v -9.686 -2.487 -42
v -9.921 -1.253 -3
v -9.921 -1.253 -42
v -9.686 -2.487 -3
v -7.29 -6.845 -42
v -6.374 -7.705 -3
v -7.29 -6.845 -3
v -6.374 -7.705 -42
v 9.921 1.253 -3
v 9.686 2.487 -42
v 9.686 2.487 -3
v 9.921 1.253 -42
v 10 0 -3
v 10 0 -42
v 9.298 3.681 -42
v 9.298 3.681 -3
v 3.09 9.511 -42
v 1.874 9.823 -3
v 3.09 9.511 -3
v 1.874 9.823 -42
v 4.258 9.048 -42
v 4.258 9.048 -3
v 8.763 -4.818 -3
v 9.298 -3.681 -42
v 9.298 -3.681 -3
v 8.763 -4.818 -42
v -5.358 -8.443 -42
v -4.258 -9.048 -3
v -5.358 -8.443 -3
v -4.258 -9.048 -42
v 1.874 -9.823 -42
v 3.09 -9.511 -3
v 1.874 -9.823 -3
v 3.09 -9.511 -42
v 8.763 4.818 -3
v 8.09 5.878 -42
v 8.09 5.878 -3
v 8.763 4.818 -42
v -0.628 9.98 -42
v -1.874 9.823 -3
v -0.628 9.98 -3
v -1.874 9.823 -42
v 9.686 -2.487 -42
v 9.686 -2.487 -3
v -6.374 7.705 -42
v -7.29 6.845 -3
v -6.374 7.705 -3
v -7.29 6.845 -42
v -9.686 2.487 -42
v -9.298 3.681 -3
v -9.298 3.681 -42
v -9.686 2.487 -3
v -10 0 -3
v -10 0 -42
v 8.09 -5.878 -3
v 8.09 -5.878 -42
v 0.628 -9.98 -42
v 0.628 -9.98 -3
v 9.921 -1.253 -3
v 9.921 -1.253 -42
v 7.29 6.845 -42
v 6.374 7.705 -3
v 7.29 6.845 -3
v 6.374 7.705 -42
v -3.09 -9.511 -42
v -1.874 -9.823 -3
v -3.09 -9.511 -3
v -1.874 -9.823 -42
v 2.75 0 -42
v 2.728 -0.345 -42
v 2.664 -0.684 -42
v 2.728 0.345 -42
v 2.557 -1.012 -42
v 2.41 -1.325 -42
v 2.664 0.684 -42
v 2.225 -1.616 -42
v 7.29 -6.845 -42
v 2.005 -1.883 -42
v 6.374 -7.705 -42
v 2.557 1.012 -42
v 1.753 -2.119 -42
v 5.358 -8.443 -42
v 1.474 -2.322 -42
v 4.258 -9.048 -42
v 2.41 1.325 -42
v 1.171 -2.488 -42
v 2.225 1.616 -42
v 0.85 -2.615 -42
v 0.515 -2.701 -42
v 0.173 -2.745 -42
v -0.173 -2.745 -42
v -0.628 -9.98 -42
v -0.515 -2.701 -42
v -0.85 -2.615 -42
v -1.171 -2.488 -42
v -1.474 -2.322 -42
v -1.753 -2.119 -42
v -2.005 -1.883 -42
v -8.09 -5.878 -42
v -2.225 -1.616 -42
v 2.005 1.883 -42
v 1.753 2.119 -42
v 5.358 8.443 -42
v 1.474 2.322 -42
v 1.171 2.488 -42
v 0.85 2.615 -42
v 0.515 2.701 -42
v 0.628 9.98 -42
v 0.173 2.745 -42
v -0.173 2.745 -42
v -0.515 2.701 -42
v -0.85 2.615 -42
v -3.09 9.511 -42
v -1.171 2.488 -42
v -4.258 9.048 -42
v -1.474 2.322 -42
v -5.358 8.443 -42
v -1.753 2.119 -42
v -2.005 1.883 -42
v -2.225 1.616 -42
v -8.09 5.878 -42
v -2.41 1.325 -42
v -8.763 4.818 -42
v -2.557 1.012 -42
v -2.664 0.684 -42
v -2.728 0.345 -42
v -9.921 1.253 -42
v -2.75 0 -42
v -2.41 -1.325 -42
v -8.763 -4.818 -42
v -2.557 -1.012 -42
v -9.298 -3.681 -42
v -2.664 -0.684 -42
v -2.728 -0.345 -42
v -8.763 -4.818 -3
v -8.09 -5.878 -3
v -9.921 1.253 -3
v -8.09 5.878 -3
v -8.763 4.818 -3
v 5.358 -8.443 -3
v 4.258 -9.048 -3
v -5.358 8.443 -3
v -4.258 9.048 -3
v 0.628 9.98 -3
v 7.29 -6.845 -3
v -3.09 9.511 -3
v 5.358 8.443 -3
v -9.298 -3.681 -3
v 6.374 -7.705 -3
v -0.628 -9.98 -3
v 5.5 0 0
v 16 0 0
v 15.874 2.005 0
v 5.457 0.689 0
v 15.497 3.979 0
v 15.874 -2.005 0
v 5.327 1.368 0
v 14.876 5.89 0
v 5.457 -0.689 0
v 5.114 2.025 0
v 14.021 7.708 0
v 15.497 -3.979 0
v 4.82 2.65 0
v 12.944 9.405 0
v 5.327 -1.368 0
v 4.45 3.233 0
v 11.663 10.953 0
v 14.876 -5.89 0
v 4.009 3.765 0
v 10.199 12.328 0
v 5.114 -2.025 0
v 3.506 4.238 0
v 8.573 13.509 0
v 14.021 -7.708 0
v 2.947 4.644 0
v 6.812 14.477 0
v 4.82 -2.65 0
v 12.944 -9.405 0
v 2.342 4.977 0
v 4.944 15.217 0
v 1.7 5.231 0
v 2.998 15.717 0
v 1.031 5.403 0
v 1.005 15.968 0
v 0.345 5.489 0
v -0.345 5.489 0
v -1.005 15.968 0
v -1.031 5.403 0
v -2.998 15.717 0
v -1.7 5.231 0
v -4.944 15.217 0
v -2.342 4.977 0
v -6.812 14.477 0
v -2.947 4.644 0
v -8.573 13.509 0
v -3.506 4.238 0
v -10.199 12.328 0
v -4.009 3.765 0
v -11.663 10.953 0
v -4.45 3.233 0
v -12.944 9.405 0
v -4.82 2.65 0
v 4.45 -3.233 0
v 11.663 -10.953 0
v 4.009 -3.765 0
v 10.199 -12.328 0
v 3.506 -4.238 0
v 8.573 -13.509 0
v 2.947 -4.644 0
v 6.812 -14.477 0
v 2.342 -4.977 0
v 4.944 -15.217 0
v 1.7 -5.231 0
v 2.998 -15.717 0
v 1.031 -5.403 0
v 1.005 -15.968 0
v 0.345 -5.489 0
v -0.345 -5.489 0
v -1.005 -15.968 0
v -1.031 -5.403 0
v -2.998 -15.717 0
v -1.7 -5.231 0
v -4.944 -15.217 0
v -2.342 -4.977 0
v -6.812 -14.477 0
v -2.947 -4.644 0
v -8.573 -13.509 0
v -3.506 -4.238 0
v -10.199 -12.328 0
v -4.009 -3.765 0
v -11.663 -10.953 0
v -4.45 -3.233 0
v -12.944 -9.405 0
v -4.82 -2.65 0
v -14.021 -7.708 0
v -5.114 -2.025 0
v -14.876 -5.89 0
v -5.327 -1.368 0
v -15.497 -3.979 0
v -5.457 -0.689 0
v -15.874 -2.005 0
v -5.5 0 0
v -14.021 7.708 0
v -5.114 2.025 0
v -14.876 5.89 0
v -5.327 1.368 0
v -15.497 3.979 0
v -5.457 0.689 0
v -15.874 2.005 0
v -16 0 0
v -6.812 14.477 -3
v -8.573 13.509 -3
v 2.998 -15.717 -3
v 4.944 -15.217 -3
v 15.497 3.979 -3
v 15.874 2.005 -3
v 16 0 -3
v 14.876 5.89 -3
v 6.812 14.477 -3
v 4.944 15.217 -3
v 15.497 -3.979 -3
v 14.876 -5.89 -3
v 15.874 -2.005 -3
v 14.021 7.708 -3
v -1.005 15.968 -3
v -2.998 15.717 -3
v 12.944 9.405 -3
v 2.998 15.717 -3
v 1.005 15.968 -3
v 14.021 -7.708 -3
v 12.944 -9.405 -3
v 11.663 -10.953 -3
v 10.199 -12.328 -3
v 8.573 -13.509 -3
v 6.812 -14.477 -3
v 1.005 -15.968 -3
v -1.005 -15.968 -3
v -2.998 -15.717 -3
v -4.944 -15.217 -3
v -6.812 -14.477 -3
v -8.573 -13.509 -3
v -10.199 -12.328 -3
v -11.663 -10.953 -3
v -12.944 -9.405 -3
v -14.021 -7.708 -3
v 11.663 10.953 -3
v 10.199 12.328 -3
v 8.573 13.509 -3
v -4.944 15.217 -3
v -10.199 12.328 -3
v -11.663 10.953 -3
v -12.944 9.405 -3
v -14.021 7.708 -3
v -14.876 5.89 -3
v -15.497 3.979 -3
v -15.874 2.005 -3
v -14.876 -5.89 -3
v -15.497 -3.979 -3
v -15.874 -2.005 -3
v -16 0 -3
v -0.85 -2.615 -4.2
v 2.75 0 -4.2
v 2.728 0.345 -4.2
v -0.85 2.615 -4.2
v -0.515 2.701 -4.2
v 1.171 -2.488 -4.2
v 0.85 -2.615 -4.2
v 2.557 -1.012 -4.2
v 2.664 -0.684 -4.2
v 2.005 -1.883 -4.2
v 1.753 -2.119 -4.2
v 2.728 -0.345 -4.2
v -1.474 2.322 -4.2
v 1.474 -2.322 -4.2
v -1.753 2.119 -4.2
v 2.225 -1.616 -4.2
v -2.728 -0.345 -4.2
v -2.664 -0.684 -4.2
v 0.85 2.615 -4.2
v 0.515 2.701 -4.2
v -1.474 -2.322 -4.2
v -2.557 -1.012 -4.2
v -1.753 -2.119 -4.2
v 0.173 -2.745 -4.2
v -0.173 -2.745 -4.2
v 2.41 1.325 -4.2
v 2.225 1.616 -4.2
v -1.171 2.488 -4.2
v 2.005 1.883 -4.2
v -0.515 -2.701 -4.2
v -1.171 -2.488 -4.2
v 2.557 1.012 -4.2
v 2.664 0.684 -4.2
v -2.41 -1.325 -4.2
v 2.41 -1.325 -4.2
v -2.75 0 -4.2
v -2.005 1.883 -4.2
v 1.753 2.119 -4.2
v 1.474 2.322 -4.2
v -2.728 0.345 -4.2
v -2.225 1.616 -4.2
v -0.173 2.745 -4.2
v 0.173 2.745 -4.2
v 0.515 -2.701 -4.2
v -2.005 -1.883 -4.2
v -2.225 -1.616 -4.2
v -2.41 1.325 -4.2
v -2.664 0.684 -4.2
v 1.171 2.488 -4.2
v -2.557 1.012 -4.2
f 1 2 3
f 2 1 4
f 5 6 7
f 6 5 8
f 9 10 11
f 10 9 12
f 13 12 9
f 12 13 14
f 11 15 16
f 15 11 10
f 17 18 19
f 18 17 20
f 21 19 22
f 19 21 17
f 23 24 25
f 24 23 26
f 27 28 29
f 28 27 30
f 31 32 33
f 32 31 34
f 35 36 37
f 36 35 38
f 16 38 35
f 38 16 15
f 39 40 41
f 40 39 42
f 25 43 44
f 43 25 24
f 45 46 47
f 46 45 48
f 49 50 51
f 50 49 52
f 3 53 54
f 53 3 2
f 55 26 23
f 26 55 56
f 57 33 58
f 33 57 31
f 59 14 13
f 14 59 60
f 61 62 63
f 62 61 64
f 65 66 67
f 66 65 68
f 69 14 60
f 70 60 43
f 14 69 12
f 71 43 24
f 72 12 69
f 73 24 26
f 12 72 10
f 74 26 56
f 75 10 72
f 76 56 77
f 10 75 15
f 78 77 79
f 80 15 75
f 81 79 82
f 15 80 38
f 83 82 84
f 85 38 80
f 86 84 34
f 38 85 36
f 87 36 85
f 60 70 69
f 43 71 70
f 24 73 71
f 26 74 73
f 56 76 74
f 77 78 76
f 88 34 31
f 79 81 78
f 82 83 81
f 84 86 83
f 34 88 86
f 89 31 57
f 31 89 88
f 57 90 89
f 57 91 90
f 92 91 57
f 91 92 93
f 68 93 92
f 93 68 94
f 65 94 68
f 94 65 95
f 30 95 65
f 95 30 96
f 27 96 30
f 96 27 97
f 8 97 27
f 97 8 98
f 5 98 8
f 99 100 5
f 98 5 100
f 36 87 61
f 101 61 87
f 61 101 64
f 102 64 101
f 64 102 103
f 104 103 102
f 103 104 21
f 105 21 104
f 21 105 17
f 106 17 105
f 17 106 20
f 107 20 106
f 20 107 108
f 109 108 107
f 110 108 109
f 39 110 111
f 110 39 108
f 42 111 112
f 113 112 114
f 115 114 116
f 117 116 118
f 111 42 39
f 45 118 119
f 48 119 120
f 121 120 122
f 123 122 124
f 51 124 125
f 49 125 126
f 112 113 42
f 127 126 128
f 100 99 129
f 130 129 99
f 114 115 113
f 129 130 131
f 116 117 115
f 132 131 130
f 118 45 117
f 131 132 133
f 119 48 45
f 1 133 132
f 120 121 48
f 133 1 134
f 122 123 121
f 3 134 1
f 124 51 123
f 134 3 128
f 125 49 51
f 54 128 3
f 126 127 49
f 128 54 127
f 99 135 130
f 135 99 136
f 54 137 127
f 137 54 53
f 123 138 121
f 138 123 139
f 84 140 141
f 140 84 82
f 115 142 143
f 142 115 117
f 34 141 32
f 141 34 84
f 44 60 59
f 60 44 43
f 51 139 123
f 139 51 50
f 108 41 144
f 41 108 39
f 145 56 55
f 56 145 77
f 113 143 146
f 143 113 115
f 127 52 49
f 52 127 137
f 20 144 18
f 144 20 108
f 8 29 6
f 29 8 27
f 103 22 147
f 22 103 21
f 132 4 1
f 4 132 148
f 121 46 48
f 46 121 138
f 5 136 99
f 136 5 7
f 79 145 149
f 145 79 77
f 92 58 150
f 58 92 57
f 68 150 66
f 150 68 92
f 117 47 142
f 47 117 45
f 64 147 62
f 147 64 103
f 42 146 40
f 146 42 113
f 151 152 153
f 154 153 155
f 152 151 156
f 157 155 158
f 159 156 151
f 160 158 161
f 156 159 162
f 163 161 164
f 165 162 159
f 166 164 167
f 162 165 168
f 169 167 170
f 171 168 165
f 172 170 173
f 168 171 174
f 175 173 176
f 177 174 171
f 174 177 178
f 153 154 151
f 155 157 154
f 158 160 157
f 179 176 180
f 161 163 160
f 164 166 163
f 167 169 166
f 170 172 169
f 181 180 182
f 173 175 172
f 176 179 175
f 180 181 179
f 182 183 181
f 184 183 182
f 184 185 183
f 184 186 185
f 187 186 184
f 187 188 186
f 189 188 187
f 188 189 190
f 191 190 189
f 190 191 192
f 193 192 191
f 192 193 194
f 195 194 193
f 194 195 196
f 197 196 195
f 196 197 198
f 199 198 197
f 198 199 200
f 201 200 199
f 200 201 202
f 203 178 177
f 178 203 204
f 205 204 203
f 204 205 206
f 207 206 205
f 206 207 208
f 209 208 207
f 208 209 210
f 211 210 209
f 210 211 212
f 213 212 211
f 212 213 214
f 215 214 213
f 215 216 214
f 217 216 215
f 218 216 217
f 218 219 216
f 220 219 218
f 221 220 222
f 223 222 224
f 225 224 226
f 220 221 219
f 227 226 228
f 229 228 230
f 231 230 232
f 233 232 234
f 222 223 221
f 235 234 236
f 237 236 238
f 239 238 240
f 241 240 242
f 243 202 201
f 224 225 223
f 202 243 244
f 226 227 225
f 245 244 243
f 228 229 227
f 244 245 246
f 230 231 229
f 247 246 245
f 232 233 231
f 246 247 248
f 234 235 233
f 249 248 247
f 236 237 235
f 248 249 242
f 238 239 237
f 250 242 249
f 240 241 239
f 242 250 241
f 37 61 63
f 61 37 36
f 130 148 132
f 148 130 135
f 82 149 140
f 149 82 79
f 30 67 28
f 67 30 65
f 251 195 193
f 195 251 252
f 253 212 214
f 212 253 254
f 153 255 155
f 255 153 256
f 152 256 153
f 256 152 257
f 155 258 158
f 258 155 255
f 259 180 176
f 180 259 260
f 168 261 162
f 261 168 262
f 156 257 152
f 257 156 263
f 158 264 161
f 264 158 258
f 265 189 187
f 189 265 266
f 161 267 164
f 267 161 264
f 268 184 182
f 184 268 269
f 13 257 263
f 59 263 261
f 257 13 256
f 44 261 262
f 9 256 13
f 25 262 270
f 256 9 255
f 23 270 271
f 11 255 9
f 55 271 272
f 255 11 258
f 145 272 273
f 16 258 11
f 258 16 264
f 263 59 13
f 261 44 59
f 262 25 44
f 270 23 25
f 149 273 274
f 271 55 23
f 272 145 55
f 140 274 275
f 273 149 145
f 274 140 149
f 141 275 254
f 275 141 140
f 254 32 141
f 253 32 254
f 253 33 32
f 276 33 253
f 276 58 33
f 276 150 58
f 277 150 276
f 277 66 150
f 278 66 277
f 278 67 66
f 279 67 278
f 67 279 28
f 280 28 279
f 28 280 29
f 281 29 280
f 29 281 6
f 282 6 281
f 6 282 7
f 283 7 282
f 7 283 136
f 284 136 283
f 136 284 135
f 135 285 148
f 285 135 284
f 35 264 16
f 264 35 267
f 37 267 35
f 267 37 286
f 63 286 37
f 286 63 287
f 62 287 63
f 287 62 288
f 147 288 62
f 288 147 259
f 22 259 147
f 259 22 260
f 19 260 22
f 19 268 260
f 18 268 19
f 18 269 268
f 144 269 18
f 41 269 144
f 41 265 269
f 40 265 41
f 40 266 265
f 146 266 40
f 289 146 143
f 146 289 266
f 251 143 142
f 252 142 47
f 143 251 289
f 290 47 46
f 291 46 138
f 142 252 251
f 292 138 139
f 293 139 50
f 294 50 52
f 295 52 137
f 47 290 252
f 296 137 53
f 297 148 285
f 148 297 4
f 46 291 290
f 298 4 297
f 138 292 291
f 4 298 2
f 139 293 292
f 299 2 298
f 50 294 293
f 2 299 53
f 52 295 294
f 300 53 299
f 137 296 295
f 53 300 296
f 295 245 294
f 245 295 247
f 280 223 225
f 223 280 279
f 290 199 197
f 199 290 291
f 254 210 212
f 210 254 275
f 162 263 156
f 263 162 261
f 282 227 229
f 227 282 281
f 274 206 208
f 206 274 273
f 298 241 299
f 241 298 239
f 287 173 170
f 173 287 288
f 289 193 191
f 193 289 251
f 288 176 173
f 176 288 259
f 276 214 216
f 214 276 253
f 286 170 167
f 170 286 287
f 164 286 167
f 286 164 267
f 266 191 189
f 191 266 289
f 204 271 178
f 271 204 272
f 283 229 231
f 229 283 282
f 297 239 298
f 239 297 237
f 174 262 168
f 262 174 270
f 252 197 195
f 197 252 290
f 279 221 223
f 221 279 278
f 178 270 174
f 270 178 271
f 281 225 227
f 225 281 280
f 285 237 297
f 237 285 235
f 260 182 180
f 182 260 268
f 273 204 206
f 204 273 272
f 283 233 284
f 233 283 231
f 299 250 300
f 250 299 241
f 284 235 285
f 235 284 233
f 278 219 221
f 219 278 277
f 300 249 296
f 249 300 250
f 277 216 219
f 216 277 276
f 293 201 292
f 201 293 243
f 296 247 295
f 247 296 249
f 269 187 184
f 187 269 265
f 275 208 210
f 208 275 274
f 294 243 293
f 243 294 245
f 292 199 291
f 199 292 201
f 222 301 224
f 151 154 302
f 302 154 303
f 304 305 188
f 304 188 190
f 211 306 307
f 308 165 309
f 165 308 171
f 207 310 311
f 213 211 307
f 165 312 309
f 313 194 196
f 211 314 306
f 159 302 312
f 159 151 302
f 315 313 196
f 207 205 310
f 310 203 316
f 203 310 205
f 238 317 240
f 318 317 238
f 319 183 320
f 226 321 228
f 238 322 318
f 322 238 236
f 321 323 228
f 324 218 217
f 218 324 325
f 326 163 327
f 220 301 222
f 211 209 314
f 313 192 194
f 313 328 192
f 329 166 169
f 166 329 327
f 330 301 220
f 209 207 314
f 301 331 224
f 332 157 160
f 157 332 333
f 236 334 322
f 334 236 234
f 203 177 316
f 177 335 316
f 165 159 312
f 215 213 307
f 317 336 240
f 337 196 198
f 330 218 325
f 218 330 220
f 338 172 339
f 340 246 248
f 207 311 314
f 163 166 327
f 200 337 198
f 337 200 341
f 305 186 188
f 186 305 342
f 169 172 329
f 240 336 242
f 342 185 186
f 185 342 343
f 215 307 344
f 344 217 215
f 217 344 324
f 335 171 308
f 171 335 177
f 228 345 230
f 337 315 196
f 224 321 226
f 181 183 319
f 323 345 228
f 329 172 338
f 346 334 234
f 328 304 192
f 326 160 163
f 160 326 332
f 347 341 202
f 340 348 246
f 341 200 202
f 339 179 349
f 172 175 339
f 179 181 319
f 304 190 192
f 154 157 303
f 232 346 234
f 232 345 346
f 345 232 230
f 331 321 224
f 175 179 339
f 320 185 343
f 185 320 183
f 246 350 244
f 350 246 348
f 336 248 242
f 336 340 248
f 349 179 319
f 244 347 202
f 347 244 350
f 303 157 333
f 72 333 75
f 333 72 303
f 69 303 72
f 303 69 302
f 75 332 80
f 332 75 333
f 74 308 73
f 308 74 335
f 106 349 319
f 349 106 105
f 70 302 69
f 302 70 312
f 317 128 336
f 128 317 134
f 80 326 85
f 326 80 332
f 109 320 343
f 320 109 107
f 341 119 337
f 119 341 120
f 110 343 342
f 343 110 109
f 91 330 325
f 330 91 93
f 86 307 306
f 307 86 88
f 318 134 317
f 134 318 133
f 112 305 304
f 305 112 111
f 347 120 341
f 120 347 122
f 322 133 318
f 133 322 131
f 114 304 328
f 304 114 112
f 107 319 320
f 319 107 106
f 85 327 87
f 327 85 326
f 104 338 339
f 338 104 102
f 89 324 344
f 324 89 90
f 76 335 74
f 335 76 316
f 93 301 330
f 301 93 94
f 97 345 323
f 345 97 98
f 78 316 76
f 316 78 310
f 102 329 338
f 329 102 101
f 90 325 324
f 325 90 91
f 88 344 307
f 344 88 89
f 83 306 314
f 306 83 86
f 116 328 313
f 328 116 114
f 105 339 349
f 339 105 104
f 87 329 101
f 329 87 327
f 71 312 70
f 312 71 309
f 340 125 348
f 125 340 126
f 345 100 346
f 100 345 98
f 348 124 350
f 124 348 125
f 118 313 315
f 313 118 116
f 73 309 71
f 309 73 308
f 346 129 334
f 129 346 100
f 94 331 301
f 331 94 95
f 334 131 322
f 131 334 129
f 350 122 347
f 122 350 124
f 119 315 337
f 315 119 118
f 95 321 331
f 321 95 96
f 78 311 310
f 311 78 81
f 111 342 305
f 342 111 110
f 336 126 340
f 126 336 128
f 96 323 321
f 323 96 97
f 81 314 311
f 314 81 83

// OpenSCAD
$fn = 50;


difference() {
	union() {
		translate(v = [0, 0, -42.0000000000]) {
			cylinder(h = 42, r = 10.0000000000);
		}
		translate(v = [0, 0, -3.0000000000]) {
			cylinder(h = 3, r = 16.0000000000);
		}
	}
	union() {
		translate(v = [0, 0, 0]) {
			rotate(a = [0, 0, 0]) {
				difference() {
					union() {
						#translate(v = [0, 0, -42.0000000000]) {
							cylinder(h = 42, r = 2.2500000000);
						}
						#translate(v = [0, 0, -4.2000000000]) {
							cylinder(h = 4.2000000000, r1 = 2.7500000000, r2 = 5.5000000000);
						}
						#translate(v = [0, 0, -42.0000000000]) {
							cylinder(h = 42, r = 2.7500000000);
						}
						#translate(v = [0, 0, -42.0000000000]) {
							cylinder(h = 42, r = 2.2500000000);
						}
					}
					union();
				}
			}
		}
	}
}
